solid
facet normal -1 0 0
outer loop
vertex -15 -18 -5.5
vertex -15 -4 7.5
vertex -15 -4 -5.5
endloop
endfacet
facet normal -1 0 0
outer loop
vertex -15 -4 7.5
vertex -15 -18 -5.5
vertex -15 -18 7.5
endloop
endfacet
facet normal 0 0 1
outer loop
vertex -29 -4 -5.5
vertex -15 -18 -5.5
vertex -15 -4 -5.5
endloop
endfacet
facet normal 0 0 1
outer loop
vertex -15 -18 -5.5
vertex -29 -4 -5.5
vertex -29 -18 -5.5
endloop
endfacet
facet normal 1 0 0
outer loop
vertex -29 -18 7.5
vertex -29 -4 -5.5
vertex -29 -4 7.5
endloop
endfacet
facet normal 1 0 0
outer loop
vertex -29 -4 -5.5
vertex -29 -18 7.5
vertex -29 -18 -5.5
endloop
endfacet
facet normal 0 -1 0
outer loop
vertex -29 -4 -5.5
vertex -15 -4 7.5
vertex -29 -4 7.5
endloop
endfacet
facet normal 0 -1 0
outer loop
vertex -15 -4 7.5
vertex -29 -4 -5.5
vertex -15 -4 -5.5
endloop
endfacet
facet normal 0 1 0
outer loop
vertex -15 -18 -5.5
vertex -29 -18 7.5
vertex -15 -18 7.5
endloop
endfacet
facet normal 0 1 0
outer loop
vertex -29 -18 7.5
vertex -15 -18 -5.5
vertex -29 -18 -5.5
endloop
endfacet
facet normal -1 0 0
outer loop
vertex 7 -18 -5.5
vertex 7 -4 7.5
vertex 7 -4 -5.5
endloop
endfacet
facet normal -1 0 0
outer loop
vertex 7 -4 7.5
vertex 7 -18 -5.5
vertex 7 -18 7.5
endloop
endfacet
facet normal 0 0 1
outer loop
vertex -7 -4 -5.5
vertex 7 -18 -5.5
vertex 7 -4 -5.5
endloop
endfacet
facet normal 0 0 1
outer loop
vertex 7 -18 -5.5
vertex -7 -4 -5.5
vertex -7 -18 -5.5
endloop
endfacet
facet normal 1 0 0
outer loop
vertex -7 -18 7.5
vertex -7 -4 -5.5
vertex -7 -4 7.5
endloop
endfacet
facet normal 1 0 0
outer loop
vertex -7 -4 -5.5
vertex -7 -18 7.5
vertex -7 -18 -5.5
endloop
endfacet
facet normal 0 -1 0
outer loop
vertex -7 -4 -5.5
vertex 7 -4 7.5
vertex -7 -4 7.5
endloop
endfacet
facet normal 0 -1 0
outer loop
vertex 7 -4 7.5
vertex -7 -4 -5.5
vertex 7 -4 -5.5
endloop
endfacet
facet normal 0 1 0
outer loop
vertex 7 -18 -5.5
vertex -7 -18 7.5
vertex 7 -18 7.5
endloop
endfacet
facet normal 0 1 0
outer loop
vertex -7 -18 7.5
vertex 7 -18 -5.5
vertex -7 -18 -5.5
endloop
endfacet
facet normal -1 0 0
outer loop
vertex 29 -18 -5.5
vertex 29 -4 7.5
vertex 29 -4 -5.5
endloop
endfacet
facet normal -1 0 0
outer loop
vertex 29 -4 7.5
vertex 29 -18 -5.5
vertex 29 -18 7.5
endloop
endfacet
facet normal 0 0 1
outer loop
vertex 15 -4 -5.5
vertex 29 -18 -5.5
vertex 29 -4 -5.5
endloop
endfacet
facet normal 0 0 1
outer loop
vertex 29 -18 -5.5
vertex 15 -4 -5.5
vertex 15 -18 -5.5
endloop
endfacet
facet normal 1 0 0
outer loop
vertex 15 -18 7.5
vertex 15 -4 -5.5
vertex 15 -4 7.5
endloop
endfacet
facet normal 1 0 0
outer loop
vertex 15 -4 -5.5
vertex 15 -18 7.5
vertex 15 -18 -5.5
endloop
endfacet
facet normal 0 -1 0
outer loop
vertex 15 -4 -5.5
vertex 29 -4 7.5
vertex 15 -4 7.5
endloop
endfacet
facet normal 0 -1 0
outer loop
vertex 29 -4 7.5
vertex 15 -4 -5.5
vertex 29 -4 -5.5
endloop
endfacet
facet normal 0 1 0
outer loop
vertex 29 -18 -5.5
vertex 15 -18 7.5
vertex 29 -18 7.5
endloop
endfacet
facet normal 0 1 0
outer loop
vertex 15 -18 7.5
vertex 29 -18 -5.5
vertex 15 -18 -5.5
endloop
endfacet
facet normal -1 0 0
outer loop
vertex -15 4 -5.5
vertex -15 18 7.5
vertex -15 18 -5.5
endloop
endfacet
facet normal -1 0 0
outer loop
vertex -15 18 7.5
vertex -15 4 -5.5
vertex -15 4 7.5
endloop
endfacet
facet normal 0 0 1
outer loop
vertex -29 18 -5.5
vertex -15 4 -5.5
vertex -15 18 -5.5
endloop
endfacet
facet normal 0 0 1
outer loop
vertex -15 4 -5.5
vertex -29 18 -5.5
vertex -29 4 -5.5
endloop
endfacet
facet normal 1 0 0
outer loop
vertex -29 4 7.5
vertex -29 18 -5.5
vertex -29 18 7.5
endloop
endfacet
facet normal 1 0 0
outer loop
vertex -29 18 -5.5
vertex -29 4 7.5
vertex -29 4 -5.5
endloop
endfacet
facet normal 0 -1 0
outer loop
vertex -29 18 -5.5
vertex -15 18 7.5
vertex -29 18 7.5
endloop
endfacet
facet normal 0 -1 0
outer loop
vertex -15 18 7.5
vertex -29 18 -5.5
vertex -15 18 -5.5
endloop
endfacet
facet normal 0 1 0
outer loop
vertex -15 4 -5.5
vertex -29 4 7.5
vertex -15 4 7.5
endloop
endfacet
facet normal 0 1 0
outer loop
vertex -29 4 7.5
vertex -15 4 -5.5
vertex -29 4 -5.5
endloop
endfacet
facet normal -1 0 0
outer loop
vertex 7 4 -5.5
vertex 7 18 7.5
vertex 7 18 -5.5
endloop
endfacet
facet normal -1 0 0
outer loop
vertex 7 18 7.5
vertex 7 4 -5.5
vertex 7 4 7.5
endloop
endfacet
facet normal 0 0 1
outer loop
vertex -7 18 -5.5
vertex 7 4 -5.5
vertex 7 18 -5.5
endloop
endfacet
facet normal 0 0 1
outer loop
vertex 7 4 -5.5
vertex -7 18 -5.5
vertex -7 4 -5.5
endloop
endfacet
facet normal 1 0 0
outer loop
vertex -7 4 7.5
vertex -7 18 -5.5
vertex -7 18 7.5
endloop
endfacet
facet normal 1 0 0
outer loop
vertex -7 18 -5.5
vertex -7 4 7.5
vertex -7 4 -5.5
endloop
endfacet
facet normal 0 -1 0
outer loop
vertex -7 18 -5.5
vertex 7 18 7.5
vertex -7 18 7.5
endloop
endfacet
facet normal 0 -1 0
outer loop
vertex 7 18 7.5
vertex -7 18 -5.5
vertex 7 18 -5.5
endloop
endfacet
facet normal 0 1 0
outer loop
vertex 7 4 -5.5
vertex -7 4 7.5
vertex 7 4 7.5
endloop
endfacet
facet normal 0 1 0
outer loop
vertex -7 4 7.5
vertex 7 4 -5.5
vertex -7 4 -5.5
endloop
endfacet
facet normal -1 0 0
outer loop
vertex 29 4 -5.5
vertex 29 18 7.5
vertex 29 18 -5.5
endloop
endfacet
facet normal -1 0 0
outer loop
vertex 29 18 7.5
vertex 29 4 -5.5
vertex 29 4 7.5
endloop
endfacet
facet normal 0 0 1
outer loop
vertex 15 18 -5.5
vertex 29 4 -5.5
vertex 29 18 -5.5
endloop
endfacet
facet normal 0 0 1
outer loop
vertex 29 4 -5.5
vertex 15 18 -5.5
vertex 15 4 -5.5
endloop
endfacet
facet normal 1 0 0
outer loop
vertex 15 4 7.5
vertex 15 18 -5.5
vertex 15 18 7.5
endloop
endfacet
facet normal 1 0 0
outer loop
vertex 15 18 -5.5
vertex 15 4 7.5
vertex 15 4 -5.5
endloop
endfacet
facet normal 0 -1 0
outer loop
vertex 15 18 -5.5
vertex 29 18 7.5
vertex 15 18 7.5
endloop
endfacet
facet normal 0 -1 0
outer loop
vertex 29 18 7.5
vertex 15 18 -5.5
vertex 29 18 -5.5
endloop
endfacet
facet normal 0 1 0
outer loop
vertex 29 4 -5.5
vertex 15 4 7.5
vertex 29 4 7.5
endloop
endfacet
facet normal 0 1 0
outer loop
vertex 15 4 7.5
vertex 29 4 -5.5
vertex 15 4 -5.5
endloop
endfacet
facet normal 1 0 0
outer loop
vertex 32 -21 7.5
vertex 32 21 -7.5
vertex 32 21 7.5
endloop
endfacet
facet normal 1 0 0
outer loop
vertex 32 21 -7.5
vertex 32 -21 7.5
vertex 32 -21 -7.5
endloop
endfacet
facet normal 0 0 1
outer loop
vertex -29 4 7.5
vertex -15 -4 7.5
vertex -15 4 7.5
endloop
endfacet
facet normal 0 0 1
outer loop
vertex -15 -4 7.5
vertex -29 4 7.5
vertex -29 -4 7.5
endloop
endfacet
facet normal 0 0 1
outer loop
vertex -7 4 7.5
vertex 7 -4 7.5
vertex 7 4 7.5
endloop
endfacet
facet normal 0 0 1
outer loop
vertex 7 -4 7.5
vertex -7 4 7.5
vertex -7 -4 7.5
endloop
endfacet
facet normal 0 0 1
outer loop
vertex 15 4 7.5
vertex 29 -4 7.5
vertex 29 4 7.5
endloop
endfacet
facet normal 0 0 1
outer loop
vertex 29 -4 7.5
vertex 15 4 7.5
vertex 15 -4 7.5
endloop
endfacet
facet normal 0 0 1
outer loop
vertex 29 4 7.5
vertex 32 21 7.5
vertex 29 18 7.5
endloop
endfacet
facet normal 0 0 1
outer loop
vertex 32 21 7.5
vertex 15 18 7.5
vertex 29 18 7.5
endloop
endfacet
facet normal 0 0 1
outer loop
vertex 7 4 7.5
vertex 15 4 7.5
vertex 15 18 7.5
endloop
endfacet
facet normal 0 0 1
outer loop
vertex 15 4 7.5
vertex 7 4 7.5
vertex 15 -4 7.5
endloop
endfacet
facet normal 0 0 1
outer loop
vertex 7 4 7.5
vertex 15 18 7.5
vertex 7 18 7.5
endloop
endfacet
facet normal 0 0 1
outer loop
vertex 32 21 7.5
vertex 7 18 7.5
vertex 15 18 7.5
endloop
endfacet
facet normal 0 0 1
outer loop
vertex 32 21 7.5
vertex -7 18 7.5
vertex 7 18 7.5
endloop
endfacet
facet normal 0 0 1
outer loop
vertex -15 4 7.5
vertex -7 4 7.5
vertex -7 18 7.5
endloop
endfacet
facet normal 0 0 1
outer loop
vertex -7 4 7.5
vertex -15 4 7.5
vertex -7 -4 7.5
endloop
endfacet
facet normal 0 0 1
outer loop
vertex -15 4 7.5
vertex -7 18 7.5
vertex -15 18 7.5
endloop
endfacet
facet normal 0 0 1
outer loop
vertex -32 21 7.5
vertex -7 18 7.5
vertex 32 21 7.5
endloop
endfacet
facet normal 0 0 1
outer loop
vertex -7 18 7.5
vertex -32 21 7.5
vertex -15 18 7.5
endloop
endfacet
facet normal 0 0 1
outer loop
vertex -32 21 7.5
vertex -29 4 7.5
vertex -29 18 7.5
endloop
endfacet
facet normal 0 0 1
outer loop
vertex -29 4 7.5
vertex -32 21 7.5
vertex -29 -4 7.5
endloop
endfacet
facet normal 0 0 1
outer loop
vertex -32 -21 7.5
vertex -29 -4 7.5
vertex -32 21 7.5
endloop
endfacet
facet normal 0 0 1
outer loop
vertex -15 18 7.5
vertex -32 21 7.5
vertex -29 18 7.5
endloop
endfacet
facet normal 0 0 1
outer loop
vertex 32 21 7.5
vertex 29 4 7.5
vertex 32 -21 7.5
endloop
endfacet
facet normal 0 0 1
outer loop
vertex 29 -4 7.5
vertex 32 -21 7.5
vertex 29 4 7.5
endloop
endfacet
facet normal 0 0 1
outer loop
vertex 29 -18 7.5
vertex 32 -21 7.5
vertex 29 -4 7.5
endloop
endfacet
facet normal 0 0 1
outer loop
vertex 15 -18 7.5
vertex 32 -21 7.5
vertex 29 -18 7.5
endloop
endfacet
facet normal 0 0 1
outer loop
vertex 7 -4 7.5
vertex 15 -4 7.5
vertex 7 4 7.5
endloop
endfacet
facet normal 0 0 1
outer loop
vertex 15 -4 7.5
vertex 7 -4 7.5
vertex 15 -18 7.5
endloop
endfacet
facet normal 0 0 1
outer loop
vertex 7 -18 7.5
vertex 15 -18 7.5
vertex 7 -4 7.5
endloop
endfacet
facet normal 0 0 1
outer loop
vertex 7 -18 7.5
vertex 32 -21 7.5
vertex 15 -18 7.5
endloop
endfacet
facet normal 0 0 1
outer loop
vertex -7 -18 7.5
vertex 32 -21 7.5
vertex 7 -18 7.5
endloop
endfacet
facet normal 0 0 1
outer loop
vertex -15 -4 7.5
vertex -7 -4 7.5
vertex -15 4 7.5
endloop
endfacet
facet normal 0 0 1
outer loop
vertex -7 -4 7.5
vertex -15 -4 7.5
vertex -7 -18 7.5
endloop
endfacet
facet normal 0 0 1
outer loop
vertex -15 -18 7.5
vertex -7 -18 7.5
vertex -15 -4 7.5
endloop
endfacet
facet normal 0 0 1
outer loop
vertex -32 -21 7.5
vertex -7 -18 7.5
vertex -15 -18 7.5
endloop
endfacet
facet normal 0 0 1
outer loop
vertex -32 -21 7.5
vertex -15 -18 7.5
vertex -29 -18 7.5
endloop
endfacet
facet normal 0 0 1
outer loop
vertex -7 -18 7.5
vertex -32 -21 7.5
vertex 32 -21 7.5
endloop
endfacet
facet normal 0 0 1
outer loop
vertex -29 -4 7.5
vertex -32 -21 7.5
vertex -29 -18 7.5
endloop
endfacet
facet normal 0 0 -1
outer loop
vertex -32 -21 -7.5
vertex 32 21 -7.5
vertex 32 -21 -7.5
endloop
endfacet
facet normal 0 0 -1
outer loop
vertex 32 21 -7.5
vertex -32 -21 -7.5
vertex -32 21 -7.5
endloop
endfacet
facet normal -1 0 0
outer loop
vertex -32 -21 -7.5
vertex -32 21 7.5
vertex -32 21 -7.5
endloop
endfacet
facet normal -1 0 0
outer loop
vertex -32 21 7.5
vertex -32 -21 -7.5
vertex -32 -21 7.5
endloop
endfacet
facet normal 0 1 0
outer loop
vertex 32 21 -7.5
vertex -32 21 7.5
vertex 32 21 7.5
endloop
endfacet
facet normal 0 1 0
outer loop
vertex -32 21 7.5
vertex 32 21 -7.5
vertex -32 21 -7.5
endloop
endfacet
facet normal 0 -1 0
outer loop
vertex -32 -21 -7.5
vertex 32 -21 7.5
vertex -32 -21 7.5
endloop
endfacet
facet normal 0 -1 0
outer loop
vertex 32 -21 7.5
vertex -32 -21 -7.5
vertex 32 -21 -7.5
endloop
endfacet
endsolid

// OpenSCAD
$fn = 32;

// ----------------------------------------------------------------------
// Pocket plate 64 x 42 x 15
// 2 x 3 pockets 14 mm square, 13 mm deep
// ----------------------------------------------------------------------

// --- parameters (mm) ---
thickness = 15;  // plate thickness
floor_t = 2;     // material left under each pocket
pocket = 14;     // pocket side length
pitch_x = 22;    // pocket pitch along X
pitch_y = 22;    // pocket pitch along Y
cols = 3;        // pockets per row
rows = 2;        // rows of pockets

// --- derived feature positions (mm) ---
depth = thickness - floor_t;        // = 13   pocket depth, down to the floor
span_x = (cols - 1) * pitch_x;      // = 44   distance between outer pockets
span_y = (rows - 1) * pitch_y;      // = 22   distance between outer pocket rows
origin_x = -span_x / 2;             // = -22   X of the first pocket
origin_y = -span_y / 2;             // = -11   Y of the first pocket
plate = [span_x + pocket + 6, span_y + pocket + 6, thickness];  // = [64, 42, 15]   overall size: pockets plus 3 mm of wall on each side
feature_centers = [
  [origin_x + 0 * pitch_x, origin_y + 0 * pitch_y],
  [origin_x + 1 * pitch_x, origin_y + 0 * pitch_y],
  [origin_x + 2 * pitch_x, origin_y + 0 * pitch_y],
  [origin_x + 0 * pitch_x, origin_y + 1 * pitch_y],
  [origin_x + 1 * pitch_x, origin_y + 1 * pitch_y],
  [origin_x + 2 * pitch_x, origin_y + 1 * pitch_y]
];   // pocket centres, used verbatim by the cutter loop

// plate outline, then one pocket per centre in feature_centers
difference() {
  cube(plate, center = true);
  for (centre = feature_centers)
    translate([centre[0] - pocket / 2, centre[1] - pocket / 2, plate[2] / 2 - depth])
      cube([pocket, pocket, depth + 1]);  // centred on the declared pocket centre
}
